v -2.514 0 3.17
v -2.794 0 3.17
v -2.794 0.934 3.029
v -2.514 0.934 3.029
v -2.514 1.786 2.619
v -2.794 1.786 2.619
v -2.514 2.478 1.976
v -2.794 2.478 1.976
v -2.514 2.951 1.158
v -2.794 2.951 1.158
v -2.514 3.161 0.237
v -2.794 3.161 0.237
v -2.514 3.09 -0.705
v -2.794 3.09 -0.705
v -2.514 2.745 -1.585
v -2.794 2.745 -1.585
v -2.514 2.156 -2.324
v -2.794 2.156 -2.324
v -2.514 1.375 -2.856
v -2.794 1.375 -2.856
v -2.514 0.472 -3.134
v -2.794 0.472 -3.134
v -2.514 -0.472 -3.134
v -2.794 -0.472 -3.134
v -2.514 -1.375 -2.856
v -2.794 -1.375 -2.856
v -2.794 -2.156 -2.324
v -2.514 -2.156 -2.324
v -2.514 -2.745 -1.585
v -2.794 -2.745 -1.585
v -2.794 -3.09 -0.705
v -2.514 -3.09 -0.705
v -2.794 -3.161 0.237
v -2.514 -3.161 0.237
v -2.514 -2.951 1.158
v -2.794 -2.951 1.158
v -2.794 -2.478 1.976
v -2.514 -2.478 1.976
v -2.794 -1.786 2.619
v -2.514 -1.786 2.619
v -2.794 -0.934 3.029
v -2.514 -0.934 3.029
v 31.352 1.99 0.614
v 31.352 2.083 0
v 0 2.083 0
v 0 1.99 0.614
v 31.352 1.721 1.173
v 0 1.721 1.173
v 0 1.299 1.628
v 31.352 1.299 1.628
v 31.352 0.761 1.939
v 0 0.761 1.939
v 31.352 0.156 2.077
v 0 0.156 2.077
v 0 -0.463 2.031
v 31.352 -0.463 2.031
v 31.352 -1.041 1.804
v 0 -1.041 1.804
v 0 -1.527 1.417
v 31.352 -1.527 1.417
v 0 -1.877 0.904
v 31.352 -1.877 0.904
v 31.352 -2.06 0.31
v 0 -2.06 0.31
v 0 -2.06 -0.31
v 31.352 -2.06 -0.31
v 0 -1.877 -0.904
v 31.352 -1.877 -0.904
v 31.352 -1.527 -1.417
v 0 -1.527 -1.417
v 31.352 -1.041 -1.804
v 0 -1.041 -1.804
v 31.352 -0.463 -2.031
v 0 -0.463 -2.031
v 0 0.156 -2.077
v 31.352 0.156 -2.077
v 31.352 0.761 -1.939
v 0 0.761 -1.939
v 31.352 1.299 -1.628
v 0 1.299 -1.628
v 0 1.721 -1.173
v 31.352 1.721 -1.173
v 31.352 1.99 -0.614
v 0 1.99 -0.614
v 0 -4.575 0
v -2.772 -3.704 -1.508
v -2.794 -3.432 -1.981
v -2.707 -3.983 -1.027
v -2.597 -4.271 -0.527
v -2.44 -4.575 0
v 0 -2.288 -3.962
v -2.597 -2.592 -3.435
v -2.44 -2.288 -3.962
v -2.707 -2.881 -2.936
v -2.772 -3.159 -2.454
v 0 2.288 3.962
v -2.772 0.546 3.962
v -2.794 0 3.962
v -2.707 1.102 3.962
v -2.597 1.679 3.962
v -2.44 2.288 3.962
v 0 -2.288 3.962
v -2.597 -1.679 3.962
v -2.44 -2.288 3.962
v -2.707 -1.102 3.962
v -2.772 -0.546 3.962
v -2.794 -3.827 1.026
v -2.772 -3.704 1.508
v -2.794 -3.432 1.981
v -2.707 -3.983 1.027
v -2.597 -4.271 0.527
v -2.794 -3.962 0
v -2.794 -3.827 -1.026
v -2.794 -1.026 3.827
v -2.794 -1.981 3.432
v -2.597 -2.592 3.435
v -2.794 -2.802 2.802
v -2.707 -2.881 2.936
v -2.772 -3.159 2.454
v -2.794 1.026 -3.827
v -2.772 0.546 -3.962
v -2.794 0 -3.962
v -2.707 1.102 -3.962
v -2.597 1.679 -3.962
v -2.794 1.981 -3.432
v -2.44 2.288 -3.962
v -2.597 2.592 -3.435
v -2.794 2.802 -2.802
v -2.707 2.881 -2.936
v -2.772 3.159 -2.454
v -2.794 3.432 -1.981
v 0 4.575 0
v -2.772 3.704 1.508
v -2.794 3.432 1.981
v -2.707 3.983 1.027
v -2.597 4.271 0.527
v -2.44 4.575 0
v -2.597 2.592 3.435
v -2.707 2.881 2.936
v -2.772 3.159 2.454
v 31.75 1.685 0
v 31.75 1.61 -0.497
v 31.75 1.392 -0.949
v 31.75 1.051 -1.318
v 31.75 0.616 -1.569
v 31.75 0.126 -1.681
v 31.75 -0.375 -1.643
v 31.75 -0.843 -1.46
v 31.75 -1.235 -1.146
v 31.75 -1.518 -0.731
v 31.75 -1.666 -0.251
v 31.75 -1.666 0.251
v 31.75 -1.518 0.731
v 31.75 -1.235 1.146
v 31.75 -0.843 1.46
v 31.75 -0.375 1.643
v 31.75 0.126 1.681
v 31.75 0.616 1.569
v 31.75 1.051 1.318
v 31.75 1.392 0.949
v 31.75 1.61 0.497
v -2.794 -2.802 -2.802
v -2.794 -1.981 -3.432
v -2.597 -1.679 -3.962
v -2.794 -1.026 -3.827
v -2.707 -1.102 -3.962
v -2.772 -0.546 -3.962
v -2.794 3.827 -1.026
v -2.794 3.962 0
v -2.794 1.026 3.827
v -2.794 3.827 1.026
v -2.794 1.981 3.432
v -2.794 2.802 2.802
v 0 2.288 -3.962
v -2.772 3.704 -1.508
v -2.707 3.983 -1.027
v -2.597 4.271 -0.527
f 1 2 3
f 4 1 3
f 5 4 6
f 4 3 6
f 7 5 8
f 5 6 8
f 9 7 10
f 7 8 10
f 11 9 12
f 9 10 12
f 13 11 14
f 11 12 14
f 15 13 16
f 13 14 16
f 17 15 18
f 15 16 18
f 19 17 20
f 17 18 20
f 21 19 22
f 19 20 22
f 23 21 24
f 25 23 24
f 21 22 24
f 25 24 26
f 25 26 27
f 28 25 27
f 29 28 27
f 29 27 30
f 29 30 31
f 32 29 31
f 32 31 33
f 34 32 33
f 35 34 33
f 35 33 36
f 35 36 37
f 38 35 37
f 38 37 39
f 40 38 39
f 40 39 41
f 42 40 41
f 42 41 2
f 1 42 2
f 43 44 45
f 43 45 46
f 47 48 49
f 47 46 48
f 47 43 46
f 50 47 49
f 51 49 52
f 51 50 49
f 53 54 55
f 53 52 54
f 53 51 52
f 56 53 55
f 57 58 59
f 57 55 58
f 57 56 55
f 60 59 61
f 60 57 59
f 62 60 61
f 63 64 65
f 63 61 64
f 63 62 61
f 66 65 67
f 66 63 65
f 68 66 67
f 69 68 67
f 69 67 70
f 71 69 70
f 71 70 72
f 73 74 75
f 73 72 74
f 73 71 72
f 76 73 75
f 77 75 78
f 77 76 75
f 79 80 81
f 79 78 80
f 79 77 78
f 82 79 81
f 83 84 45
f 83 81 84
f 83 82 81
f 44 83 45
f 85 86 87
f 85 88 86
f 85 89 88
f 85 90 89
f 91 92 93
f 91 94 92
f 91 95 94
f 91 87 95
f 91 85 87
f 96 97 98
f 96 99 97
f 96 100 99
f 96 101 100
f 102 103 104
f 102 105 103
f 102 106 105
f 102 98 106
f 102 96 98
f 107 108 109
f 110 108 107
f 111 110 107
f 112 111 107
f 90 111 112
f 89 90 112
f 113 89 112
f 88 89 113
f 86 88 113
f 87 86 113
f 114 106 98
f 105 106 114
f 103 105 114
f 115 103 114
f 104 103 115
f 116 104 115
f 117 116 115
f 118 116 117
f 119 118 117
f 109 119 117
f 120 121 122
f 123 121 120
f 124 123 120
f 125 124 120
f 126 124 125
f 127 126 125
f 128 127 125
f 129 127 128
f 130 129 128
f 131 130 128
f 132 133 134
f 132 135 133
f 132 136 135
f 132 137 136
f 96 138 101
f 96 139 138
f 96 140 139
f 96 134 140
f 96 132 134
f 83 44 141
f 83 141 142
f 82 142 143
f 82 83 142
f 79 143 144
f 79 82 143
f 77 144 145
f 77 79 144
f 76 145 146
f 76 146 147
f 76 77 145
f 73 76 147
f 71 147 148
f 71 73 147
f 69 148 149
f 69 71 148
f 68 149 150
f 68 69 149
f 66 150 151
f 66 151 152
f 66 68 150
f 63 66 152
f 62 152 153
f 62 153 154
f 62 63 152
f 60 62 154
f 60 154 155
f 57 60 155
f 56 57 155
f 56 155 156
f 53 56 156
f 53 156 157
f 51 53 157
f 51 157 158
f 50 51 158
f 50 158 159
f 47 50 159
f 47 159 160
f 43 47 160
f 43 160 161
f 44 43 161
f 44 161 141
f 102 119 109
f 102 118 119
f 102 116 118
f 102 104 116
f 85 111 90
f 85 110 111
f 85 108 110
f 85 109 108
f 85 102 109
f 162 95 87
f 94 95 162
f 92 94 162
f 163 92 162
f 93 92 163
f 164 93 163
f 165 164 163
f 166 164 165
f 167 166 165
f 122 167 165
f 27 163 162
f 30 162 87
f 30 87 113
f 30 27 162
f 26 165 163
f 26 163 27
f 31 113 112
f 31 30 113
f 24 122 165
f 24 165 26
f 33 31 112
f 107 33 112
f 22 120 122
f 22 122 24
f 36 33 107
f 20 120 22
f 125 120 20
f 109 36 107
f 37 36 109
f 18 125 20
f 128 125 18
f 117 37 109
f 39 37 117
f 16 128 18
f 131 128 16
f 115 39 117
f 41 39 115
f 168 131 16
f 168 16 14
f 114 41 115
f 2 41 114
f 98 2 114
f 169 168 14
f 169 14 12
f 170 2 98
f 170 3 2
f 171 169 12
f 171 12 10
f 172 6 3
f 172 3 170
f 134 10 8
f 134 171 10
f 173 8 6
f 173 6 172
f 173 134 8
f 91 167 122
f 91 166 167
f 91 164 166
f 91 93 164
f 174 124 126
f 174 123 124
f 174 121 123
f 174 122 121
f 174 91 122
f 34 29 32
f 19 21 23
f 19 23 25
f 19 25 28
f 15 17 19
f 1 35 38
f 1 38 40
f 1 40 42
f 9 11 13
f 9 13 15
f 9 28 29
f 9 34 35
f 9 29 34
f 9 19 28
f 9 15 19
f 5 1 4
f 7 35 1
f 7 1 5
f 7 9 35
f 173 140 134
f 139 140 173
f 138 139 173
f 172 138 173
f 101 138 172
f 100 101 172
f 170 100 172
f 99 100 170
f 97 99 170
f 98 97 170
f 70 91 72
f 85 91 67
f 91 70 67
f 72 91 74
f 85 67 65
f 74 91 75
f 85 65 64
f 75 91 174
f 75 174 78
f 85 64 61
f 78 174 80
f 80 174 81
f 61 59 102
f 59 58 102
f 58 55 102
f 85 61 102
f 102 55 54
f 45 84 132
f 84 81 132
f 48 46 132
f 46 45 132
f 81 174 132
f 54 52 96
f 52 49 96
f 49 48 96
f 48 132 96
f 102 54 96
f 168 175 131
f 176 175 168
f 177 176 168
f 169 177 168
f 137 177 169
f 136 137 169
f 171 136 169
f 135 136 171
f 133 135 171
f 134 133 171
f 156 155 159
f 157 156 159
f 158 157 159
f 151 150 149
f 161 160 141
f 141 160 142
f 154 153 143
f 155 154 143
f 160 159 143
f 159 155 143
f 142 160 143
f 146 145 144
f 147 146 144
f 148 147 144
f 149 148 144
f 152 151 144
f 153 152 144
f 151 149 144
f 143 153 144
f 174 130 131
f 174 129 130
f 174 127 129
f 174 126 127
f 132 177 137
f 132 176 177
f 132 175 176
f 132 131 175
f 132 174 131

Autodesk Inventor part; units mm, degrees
ref_plane "YZ Plane" through (0, 0, 0) normal (1, 0, 0) x (0, 1, 0)
ref_plane "XZ Plane" through (0, 0, 0) normal (0, 1, 0) x (-1, 0, 0)
sketch "Sketch1" plane through (0, 0, 0) normal (0, 0, 1) x (1, 0, 0)
  line L0 (0, 2.0828) -> (31.75, 2.0828)
  line L1 (31.75, 2.0828) -> (31.75, 0)
  line L2 (31.75, 0) -> (0, 0)
  line L3 (0, 0) -> (0, 2.0828)
  line L4 (0, -0.4166) -> (0, 2.4994) projected
  line L5 (-6.35, 0) -> (38.1, 0) projected
  dimension "d1" = 4.1656
  dimension "d13" = 31.75
revolve "Body" add sketch "Sketch1" angle 360 about axis through (31.75, 0, 0) along (-1, 0, 0)
sketch "Sketch2" plane through (0, 0, 0) normal (-1, 0, 0) x (0, 0, 1)
  line L0 (0, 4.5754) -> (3.9624, 2.2877)
  line L1 (3.9624, 2.2877) -> (3.9624, -2.2877)
  line L2 (3.9624, -2.2877) -> (0, -4.5754)
  line L3 (0, -4.5754) -> (-3.9624, -2.2877)
  line L4 (-3.9624, -2.2877) -> (-3.9624, 2.2877)
  line L5 (-3.9624, 2.2877) -> (0, 4.5754)
  line L6 (-5.5474, 0) -> (5.5474, 0) projected
  line L7 (0, 6.4055) -> (0, -6.4055) projected
  point P0 (0, 0)
  point P1 (0, 0)
  point P2 (0, 0)
  dimension "d8" = 7.9248
extrude "Head" add sketch "Sketch2" along normal blind 2.794
sketch "Sketch3" plane through (-2.794, 0, 0) normal (-1, 0, 0) x (0, 0, 1)
  circle A0 centre (0, 0) radius 3.1699
  point P0 (0, 0)
  dimension "d18" = 6.3398
extrude "Indent" cut sketch "Sketch3" against normal blind 0.2804
sketch "Sketch4" plane through (0, 0, 0) normal (0, 0, 1) x (1, 0, 0)
  line L0 (-2.794, 3.9624) -> (-2.794, 4.5754)
  line L1 (-2.794, 4.5754) -> (-2.4401, 4.5754)
  line L2 (-2.4401, 4.5754) -> (-2.794, 3.9624)
  line L3 (-3.3528, 0) -> (0.5588, 0) projected
  line L4 (0, 4.5754) -> (-2.794, 4.5754) projected
  line L5 (-2.794, 2.2877) -> (-2.794, 4.5754) projected
  dimension "d4" = 30
  dimension "d17" = 7.9248
revolve "Chamfer1" cut sketch "Sketch4" angle 360 about axis through (-10, 0, 0) along (1, 0, 0)
thread "Thread" size "8-32 UNC" class "2A" standard "ANSI Unified Screw Threads" length 26.9875
chamfer "Chamfer2" distance 0.3975 distance2 0.3976 1 edges at (31.75, -2.0828, 0) measured on face at (31.75, 0.0273, -0.4604)
ref_plane "Work Plane1" through (1.75, 0, 0) normal (0, 0, -1) x (1, 0, 0)
equation "\"d1\" = GD"
equation "\"d13\" = NLG"
equation "\"d8\" = SW"
equation "\"d2\" = KOH - SD"
equation "\"d18\" = KOD2"
equation "\"d4\" = ANG1"
equation "\"d17\" = SW"
equation "\"d9\" = GEL"
equation "\"d5\" = -0.5 * SPD + 0.5 * GD"
equation "\"NLG\" = 31.75"
equation "\"GD\" = NND"
equation "\"BDM\" = NND"
equation "\"KOH\" = 2.794"
equation "\"GEL\" = 26.9875"
equation "\"SW\" = 7.9248"
equation "\"SPD\" = GD1"
equation "\"SD\" = 0"
equation "\"ANG1\" = 30deg"
equation "\"GAL\" = 0.39751"
equation "\"GUL\" = GAL"
equation "\"KOH2\" = 0.1 * KOH"
equation "\"KOD2\" = 0.8 * SW"
equation "\"GD1\" = 3.37058"
equation "\"THREADDIA\" = 4.1656"
equation "\"SDH\" = SW"
equation "\"TOA\" = 30deg"
equation "\"RR\" = 0.04166"
equation "\"NND\" = 4.1656"
equation "\"SW0\" = SW"
equation "\"SD2\" = NND"
equation "\"E0\" = 1.155 * SW"
properties part number "ANSI B18.6.3 - 8-32 UNC - 1.25" material "Steel, Mild"
